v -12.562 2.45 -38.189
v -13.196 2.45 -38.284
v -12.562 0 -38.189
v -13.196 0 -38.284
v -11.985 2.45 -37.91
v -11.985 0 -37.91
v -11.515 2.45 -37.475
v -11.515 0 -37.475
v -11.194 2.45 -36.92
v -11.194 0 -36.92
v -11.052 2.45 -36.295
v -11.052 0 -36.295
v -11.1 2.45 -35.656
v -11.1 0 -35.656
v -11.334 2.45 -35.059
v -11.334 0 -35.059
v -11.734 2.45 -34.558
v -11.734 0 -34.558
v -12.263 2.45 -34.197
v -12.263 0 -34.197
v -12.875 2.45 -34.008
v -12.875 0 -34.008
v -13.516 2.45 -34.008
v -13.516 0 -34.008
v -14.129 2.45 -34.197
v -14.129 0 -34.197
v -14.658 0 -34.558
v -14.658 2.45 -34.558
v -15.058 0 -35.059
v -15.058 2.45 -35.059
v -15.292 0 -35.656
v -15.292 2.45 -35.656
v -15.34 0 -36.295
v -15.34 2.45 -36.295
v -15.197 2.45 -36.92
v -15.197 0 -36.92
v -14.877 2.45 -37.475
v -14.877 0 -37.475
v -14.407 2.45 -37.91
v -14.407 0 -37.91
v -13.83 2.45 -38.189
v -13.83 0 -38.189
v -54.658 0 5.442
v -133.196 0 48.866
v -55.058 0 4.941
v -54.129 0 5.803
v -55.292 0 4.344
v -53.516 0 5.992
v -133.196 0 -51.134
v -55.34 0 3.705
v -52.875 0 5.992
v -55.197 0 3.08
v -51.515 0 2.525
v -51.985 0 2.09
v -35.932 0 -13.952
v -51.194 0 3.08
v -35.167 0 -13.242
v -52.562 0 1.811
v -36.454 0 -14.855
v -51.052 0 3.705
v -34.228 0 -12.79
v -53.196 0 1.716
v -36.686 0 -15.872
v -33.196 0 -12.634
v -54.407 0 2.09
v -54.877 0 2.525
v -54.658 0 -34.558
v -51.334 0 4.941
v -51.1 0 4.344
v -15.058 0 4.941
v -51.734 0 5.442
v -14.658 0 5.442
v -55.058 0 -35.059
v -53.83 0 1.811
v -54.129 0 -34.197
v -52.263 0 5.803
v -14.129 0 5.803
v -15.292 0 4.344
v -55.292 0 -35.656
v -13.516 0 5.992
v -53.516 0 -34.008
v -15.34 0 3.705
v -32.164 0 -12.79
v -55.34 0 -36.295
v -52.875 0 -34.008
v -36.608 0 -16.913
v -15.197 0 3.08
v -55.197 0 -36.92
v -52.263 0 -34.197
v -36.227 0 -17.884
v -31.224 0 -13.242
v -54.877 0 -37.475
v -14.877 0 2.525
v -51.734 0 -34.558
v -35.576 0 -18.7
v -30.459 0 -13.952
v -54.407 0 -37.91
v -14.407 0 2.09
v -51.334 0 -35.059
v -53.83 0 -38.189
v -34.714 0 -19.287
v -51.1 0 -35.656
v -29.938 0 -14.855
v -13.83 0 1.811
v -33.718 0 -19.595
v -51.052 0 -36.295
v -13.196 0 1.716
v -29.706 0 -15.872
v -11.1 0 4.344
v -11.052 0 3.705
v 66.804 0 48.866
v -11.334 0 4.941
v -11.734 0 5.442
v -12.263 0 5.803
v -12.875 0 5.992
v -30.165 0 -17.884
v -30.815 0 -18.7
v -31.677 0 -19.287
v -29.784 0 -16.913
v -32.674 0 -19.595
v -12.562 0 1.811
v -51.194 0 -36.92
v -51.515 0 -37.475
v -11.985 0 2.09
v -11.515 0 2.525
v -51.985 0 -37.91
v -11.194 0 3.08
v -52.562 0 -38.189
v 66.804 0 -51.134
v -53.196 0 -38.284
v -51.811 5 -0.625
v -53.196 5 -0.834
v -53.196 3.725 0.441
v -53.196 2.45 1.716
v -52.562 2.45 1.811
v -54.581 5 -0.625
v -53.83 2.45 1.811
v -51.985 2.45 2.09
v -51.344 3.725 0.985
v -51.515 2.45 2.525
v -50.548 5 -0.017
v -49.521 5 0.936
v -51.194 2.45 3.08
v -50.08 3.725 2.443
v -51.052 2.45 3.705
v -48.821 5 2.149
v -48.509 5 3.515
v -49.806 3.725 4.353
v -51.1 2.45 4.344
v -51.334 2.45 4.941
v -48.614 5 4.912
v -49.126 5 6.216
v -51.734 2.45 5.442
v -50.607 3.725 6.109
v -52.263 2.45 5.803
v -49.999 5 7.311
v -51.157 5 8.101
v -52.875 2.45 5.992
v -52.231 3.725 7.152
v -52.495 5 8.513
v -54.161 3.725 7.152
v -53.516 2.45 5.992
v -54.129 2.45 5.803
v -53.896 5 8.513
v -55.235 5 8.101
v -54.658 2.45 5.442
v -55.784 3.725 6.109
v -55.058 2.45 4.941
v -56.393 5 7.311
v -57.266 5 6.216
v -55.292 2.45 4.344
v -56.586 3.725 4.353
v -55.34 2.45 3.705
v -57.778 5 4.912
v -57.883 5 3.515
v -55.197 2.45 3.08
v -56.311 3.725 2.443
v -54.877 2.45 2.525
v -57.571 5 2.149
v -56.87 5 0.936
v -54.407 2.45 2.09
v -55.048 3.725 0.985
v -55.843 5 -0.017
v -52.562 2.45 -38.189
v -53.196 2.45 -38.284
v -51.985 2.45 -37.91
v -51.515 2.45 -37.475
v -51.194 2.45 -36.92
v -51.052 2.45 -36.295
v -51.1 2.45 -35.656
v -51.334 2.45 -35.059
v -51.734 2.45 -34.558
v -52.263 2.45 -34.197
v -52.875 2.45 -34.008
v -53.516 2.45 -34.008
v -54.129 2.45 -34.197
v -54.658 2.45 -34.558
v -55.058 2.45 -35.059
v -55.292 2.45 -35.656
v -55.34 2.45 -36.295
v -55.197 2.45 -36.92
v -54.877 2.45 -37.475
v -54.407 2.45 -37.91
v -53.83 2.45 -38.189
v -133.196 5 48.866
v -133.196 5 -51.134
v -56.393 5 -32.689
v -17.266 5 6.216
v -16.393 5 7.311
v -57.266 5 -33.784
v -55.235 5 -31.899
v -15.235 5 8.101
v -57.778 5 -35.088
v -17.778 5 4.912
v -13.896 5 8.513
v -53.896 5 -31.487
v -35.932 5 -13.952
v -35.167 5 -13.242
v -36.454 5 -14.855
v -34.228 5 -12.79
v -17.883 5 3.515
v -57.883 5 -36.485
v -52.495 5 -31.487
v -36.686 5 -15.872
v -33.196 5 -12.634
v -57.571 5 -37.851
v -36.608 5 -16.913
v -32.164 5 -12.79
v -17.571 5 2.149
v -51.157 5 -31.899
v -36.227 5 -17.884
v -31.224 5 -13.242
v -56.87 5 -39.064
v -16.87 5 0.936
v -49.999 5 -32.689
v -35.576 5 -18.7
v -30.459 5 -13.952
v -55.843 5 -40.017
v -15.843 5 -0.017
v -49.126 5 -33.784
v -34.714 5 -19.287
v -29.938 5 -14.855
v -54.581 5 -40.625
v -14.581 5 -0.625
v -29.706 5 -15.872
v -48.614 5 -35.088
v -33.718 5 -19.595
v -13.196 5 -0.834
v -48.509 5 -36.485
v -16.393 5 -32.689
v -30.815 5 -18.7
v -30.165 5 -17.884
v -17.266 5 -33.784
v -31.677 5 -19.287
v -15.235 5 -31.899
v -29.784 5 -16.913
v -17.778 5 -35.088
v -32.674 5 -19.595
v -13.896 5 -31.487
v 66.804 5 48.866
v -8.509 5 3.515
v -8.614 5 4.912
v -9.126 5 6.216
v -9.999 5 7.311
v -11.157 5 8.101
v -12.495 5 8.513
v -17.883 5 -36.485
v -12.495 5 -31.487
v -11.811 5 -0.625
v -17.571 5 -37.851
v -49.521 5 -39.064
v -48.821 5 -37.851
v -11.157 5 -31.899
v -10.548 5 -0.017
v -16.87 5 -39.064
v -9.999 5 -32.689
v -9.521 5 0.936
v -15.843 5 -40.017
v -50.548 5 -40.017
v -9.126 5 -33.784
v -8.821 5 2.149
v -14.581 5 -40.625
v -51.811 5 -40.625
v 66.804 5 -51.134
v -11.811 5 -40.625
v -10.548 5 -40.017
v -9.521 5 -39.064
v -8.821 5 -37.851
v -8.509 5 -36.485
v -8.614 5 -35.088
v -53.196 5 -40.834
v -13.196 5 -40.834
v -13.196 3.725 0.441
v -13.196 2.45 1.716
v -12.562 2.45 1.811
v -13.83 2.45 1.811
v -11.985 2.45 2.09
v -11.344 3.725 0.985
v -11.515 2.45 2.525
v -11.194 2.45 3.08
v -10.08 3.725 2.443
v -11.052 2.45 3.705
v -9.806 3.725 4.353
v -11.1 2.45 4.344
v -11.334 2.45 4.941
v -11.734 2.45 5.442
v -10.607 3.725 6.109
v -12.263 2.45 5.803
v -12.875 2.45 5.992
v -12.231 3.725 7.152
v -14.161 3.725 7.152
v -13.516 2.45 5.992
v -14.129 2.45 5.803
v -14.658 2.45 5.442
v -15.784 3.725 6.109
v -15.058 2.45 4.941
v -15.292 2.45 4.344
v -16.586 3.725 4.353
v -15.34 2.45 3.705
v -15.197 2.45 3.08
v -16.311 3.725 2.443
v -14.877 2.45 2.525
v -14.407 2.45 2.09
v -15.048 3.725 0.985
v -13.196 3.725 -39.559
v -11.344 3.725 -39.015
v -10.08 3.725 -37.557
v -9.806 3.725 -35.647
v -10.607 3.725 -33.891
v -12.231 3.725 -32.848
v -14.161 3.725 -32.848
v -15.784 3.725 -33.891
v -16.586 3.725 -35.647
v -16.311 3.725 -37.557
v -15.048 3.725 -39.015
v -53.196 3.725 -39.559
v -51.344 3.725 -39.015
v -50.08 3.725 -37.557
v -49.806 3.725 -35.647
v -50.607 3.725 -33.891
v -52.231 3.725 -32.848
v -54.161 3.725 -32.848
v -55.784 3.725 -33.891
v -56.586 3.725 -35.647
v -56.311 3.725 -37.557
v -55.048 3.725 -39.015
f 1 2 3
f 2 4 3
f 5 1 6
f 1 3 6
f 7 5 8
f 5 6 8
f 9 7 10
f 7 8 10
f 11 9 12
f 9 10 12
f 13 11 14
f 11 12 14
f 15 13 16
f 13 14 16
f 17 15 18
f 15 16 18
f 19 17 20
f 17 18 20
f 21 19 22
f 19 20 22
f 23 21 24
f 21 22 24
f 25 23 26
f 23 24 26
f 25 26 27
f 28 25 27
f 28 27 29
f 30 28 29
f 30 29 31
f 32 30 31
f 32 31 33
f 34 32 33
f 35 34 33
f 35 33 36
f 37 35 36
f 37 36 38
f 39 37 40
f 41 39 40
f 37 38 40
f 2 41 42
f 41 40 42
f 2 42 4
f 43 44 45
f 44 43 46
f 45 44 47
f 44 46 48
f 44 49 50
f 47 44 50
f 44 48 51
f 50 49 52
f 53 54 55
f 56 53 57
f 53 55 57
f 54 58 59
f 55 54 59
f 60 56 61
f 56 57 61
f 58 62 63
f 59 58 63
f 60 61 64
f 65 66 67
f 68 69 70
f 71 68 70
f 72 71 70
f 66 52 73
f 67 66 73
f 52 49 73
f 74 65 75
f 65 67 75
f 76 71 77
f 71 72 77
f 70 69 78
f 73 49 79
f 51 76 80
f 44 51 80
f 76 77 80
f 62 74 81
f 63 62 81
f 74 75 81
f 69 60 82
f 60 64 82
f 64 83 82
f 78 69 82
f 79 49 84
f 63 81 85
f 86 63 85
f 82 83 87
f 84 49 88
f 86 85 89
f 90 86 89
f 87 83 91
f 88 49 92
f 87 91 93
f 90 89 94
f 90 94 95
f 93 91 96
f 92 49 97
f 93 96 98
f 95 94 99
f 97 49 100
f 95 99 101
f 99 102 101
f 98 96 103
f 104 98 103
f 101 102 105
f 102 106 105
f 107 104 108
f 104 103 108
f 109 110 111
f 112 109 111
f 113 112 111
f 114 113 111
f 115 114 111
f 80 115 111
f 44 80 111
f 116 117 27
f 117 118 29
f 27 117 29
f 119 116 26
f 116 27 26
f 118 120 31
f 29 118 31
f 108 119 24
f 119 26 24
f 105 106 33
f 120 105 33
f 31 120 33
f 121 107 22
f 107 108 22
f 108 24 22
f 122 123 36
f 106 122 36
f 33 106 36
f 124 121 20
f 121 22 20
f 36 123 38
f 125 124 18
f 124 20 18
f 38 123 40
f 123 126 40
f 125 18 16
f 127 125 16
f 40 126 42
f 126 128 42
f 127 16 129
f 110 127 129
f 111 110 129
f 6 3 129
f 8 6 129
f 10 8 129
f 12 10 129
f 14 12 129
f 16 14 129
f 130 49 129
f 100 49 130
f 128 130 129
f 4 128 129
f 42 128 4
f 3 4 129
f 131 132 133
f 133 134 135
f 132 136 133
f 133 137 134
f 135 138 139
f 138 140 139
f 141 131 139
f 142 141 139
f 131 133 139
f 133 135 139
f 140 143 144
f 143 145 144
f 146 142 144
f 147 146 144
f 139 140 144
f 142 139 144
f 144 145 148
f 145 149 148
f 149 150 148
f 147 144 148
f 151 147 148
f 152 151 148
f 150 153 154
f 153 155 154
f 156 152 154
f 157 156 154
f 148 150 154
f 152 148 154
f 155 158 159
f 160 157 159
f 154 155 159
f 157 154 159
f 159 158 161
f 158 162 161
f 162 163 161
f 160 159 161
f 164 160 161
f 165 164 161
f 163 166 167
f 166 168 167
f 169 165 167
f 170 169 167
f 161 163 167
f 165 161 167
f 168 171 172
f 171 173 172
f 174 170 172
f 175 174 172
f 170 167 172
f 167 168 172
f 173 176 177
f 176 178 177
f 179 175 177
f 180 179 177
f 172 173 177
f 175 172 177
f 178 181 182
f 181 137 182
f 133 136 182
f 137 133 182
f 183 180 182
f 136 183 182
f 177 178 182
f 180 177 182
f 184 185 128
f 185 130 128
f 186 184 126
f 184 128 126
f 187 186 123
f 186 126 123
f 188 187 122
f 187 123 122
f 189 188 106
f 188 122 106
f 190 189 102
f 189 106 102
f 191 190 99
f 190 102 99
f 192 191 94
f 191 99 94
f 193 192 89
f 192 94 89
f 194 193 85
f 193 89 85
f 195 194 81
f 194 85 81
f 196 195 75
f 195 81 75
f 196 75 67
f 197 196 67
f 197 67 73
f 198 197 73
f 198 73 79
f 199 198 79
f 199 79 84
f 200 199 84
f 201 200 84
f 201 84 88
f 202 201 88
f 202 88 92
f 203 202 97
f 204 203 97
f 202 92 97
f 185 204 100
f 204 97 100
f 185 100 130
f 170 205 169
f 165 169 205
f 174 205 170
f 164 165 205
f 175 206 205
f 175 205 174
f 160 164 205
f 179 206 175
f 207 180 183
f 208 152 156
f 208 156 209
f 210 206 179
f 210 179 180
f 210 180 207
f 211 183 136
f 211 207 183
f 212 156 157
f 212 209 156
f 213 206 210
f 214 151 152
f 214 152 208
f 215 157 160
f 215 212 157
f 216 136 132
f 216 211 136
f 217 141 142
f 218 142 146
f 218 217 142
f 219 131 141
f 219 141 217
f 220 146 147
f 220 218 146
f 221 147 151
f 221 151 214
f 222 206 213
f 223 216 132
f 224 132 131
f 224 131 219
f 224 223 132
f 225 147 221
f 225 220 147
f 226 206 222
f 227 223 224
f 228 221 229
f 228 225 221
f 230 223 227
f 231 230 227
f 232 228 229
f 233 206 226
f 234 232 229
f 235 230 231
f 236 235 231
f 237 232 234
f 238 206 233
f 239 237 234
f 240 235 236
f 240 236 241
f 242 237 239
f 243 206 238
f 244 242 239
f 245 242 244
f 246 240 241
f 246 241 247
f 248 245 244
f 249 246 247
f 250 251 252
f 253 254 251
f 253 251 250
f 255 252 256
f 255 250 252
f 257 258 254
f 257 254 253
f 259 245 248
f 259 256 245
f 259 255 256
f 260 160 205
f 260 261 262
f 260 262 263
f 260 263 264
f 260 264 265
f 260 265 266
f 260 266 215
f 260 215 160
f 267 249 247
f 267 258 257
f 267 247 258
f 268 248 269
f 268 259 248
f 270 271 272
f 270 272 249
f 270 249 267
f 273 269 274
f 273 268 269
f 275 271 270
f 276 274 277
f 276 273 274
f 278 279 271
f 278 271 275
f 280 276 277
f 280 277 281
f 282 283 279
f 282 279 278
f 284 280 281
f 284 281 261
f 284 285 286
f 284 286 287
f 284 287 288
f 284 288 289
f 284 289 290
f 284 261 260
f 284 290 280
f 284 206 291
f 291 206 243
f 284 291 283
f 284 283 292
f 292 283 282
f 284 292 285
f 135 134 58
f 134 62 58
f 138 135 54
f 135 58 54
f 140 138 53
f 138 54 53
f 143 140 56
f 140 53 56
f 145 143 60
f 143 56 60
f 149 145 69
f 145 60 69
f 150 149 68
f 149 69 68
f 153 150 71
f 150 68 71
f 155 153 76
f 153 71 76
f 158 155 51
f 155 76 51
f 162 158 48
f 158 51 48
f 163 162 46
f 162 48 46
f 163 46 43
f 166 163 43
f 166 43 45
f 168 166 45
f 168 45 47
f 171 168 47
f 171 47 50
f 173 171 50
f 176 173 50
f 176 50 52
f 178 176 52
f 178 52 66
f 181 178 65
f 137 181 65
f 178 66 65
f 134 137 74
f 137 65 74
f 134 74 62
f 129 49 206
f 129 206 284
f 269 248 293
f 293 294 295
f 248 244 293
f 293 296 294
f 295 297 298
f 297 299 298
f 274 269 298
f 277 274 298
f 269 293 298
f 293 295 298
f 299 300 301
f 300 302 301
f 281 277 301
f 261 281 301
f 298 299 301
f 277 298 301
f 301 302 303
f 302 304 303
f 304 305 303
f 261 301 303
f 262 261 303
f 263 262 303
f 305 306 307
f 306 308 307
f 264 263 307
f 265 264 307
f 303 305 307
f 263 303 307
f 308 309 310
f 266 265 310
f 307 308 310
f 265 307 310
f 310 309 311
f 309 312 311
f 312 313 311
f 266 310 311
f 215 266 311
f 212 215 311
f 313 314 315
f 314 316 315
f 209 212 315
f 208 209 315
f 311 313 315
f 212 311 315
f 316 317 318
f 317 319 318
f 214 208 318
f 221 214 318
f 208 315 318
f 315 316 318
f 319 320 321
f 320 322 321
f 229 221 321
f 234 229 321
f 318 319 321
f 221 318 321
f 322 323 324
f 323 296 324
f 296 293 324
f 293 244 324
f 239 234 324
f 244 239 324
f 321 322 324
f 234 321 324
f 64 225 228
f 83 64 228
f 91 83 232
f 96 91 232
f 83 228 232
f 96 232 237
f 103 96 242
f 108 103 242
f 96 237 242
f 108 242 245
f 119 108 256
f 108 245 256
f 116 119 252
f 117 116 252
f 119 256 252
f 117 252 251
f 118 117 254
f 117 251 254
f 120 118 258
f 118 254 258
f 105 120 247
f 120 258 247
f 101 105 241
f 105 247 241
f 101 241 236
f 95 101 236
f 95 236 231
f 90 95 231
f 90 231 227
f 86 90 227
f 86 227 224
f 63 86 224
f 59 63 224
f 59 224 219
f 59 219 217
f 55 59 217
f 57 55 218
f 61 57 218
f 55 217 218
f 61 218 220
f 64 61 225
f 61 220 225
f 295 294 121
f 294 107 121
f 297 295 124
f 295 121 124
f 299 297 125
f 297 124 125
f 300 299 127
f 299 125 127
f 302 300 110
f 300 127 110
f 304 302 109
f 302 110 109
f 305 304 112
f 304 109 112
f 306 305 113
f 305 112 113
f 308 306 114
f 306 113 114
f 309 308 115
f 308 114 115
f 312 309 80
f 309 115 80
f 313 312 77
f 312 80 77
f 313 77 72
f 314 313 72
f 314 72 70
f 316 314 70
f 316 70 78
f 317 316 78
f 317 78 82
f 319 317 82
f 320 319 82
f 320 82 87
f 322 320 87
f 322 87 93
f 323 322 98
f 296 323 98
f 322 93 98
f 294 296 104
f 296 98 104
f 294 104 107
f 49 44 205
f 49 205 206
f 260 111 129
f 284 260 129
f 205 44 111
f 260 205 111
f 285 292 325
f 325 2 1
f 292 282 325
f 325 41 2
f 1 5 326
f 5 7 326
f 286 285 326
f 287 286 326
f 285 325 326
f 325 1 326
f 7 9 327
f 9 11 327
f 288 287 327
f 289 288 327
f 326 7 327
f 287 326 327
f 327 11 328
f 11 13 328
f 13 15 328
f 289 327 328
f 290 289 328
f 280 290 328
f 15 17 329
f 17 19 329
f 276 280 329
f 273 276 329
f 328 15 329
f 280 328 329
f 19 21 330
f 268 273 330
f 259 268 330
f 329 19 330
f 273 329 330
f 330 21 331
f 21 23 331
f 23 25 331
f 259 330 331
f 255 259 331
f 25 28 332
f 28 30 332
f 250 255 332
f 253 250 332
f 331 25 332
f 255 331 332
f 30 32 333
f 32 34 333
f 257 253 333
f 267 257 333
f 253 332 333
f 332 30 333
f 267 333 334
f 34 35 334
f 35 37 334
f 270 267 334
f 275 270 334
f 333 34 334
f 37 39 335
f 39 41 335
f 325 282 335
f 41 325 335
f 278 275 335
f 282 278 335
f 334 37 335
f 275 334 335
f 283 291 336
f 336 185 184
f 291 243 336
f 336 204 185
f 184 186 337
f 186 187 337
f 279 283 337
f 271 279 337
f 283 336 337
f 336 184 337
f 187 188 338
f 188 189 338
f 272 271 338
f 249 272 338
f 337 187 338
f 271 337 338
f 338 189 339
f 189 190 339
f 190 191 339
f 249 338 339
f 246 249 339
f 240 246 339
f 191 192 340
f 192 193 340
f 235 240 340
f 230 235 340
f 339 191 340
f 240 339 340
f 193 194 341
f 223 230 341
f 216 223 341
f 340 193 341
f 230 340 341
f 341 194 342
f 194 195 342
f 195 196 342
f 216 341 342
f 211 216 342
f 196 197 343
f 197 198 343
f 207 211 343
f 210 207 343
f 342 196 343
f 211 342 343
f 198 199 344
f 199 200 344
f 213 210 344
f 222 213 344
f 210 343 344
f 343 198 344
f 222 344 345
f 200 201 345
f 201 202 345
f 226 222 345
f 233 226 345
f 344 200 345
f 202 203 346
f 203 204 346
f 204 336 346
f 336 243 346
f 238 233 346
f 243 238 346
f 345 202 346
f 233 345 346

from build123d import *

# Parameters (mm, degrees)
SKETCH1_W                                       = 200
SKETCH1_H                                       = 100
BOSS_EXTRUDE1_DEPTH                             = 5
CSK_FOR_M4_FLAT_HEAD_MACHINE_SCREW1_D           = 4.3
CSK_FOR_M4_FLAT_HEAD_MACHINE_SCREW1_DEPTH       = 6
CSK_FOR_M4_FLAT_HEAD_MACHINE_SCREW1_CSINK_D     = 9.4
CSK_FOR_M4_FLAT_HEAD_MACHINE_SCREW1_CSINK_ANGLE = 90
CSK_FOR_M4_FLAT_HEAD_MACHINE_SCREW1_TIP         = 1.291850331
SKETCH2_R                                       = 3.5
CUT_EXTRUDE1_DEPTH                              = 5


with BuildPart() as part:
    # Sketch1 → Boss-Extrude1 (new body)
    with BuildSketch(Plane(origin=(0, 0, 0), x_dir=(1, 0, 0), z_dir=(0, 1, 0))):
        with Locations((-33.195876289, 1.134020619)):
            Rectangle(SKETCH1_W, SKETCH1_H)
    extrude(amount=BOSS_EXTRUDE1_DEPTH)

    # CSK for M4 Flat Head Machine Screw1
    with Locations(Plane(origin=(-53.195876289, 5, -36.134020619), x_dir=(0, 0, 1), z_dir=(0, 1, 0))):
        with Locations((0, 0), (0, 40), (40, 40), (40, 0)):
            CounterSinkHole(CSK_FOR_M4_FLAT_HEAD_MACHINE_SCREW1_D / 2, CSK_FOR_M4_FLAT_HEAD_MACHINE_SCREW1_CSINK_D / 2, depth=CSK_FOR_M4_FLAT_HEAD_MACHINE_SCREW1_DEPTH, counter_sink_angle=CSK_FOR_M4_FLAT_HEAD_MACHINE_SCREW1_CSINK_ANGLE)
            with Locations((0, 0, -(CSK_FOR_M4_FLAT_HEAD_MACHINE_SCREW1_DEPTH + CSK_FOR_M4_FLAT_HEAD_MACHINE_SCREW1_TIP / 2))):  # 118° drill point
                Cone(0, CSK_FOR_M4_FLAT_HEAD_MACHINE_SCREW1_D / 2, CSK_FOR_M4_FLAT_HEAD_MACHINE_SCREW1_TIP, mode=Mode.SUBTRACT)

    # Sketch2 → Cut-Extrude1 (cut)
    with BuildSketch(Plane(origin=(0, 5, 0), x_dir=(1, 0, 0), z_dir=(0, 1, 0))):
        with Locations(Location((-33.195876289, 16.134020619, 0), (0, 0, 270))):
            Circle(SKETCH2_R)
    extrude(amount=-CUT_EXTRUDE1_DEPTH, mode=Mode.SUBTRACT)


solid = part.part
